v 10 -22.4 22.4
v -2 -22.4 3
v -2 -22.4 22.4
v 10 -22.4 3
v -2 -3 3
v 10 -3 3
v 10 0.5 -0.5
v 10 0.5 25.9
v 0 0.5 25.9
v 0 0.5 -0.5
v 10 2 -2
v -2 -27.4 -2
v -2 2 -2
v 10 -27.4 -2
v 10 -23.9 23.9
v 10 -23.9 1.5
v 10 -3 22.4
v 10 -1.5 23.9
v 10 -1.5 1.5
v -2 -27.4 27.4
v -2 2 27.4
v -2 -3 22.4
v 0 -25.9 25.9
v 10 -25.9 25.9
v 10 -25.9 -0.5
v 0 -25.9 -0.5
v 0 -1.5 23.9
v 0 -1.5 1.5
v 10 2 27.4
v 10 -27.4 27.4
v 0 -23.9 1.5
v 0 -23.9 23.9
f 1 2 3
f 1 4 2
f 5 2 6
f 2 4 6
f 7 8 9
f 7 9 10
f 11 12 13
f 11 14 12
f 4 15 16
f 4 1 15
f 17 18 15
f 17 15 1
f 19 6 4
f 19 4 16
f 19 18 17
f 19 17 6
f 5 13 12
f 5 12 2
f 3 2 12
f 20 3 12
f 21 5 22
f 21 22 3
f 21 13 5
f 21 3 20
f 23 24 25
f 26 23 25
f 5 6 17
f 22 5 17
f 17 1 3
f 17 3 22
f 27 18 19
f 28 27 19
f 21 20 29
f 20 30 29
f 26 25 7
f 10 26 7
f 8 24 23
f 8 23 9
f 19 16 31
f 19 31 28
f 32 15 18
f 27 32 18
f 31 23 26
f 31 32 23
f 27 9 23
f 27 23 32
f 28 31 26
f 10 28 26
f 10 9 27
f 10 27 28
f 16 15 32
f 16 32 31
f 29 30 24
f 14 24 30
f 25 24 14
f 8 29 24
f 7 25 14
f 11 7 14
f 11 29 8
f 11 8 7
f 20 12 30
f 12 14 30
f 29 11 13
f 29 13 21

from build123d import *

# Parameters (mm, degrees)
CROQUIS2_W                = 23.4
CROQUIS2_H                = 23.4
CROQUIS2_W_2              = 19.4
CROQUIS2_H_2              = 19.4
SALIENTE_EXTRUIR1_DEPTH   = 10
CROQUIS2_W_3              = 29.4
CROQUIS2_H_3              = 29.4
CROQUIS2_W_4              = 25.4
CROQUIS2_H_4              = 25.4
SALIENTE_EXTRUIR1_2_DEPTH = 10
CROQUIS3_W                = 29.4
CROQUIS3_H                = 29.4
CROQUIS3_W_2              = 19.4
CROQUIS3_H_2              = 19.4
SALIENTE_EXTRUIR2_DEPTH   = 2
CROQUIS4_W                = 26.4
CROQUIS4_H                = 26.4
CROQUIS4_W_2              = 22.4
CROQUIS4_H_2              = 22.4
CORTAR_EXTRUIR1_DEPTH     = 10


with BuildPart() as part:
    # Croquis2 → Saliente-Extruir1 (new body)
    with BuildSketch(Plane(origin=(0, 0, 0), x_dir=(0, 0, -1), z_dir=(1, 0, 0))):
        with Locations((-12.7, -12.7)):
            Rectangle(CROQUIS2_W, CROQUIS2_H)
        with Locations((-12.7, -12.7)):
            Rectangle(CROQUIS2_W_2, CROQUIS2_H_2, mode=Mode.SUBTRACT)
    extrude(amount=SALIENTE_EXTRUIR1_DEPTH)



with BuildPart() as body_2:
    # Croquis2 → Saliente-Extruir1 2 (new body)
    with BuildSketch(Plane(origin=(0, 0, 0), x_dir=(0, 0, -1), z_dir=(1, 0, 0))):
        with Locations((-12.7, -12.7)):
            Rectangle(CROQUIS2_W_3, CROQUIS2_H_3)
        with Locations((-12.7, -12.7)):
            Rectangle(CROQUIS2_W_4, CROQUIS2_H_4, mode=Mode.SUBTRACT)
    extrude(amount=SALIENTE_EXTRUIR1_2_DEPTH)


with BuildPart() as part_1:
    add(part.part)

    add(body_2.part)  # Saliente-Extruir2 merges body 2
    # Croquis3 → Saliente-Extruir2 (add)
    with BuildSketch(Plane.ZY):
        with Locations((12.7, -12.7)):
            Rectangle(CROQUIS3_W, CROQUIS3_H)
        with Locations((12.7, -12.7)):
            Rectangle(CROQUIS3_W_2, CROQUIS3_H_2, mode=Mode.SUBTRACT)
    extrude(amount=SALIENTE_EXTRUIR2_DEPTH)

    # Croquis4 → Cortar-Extruir1 (cut)
    with BuildSketch(Plane(origin=(10, 0, 0), x_dir=(0, 0, -1), z_dir=(1, 0, 0))):
        with Locations((-12.7, -12.7)):
            Rectangle(CROQUIS4_W, CROQUIS4_H)
        with Locations((-12.7, -12.7)):
            Rectangle(CROQUIS4_W_2, CROQUIS4_H_2, mode=Mode.SUBTRACT)
    extrude(amount=-CORTAR_EXTRUIR1_DEPTH, mode=Mode.SUBTRACT)


solid = part_1.part
